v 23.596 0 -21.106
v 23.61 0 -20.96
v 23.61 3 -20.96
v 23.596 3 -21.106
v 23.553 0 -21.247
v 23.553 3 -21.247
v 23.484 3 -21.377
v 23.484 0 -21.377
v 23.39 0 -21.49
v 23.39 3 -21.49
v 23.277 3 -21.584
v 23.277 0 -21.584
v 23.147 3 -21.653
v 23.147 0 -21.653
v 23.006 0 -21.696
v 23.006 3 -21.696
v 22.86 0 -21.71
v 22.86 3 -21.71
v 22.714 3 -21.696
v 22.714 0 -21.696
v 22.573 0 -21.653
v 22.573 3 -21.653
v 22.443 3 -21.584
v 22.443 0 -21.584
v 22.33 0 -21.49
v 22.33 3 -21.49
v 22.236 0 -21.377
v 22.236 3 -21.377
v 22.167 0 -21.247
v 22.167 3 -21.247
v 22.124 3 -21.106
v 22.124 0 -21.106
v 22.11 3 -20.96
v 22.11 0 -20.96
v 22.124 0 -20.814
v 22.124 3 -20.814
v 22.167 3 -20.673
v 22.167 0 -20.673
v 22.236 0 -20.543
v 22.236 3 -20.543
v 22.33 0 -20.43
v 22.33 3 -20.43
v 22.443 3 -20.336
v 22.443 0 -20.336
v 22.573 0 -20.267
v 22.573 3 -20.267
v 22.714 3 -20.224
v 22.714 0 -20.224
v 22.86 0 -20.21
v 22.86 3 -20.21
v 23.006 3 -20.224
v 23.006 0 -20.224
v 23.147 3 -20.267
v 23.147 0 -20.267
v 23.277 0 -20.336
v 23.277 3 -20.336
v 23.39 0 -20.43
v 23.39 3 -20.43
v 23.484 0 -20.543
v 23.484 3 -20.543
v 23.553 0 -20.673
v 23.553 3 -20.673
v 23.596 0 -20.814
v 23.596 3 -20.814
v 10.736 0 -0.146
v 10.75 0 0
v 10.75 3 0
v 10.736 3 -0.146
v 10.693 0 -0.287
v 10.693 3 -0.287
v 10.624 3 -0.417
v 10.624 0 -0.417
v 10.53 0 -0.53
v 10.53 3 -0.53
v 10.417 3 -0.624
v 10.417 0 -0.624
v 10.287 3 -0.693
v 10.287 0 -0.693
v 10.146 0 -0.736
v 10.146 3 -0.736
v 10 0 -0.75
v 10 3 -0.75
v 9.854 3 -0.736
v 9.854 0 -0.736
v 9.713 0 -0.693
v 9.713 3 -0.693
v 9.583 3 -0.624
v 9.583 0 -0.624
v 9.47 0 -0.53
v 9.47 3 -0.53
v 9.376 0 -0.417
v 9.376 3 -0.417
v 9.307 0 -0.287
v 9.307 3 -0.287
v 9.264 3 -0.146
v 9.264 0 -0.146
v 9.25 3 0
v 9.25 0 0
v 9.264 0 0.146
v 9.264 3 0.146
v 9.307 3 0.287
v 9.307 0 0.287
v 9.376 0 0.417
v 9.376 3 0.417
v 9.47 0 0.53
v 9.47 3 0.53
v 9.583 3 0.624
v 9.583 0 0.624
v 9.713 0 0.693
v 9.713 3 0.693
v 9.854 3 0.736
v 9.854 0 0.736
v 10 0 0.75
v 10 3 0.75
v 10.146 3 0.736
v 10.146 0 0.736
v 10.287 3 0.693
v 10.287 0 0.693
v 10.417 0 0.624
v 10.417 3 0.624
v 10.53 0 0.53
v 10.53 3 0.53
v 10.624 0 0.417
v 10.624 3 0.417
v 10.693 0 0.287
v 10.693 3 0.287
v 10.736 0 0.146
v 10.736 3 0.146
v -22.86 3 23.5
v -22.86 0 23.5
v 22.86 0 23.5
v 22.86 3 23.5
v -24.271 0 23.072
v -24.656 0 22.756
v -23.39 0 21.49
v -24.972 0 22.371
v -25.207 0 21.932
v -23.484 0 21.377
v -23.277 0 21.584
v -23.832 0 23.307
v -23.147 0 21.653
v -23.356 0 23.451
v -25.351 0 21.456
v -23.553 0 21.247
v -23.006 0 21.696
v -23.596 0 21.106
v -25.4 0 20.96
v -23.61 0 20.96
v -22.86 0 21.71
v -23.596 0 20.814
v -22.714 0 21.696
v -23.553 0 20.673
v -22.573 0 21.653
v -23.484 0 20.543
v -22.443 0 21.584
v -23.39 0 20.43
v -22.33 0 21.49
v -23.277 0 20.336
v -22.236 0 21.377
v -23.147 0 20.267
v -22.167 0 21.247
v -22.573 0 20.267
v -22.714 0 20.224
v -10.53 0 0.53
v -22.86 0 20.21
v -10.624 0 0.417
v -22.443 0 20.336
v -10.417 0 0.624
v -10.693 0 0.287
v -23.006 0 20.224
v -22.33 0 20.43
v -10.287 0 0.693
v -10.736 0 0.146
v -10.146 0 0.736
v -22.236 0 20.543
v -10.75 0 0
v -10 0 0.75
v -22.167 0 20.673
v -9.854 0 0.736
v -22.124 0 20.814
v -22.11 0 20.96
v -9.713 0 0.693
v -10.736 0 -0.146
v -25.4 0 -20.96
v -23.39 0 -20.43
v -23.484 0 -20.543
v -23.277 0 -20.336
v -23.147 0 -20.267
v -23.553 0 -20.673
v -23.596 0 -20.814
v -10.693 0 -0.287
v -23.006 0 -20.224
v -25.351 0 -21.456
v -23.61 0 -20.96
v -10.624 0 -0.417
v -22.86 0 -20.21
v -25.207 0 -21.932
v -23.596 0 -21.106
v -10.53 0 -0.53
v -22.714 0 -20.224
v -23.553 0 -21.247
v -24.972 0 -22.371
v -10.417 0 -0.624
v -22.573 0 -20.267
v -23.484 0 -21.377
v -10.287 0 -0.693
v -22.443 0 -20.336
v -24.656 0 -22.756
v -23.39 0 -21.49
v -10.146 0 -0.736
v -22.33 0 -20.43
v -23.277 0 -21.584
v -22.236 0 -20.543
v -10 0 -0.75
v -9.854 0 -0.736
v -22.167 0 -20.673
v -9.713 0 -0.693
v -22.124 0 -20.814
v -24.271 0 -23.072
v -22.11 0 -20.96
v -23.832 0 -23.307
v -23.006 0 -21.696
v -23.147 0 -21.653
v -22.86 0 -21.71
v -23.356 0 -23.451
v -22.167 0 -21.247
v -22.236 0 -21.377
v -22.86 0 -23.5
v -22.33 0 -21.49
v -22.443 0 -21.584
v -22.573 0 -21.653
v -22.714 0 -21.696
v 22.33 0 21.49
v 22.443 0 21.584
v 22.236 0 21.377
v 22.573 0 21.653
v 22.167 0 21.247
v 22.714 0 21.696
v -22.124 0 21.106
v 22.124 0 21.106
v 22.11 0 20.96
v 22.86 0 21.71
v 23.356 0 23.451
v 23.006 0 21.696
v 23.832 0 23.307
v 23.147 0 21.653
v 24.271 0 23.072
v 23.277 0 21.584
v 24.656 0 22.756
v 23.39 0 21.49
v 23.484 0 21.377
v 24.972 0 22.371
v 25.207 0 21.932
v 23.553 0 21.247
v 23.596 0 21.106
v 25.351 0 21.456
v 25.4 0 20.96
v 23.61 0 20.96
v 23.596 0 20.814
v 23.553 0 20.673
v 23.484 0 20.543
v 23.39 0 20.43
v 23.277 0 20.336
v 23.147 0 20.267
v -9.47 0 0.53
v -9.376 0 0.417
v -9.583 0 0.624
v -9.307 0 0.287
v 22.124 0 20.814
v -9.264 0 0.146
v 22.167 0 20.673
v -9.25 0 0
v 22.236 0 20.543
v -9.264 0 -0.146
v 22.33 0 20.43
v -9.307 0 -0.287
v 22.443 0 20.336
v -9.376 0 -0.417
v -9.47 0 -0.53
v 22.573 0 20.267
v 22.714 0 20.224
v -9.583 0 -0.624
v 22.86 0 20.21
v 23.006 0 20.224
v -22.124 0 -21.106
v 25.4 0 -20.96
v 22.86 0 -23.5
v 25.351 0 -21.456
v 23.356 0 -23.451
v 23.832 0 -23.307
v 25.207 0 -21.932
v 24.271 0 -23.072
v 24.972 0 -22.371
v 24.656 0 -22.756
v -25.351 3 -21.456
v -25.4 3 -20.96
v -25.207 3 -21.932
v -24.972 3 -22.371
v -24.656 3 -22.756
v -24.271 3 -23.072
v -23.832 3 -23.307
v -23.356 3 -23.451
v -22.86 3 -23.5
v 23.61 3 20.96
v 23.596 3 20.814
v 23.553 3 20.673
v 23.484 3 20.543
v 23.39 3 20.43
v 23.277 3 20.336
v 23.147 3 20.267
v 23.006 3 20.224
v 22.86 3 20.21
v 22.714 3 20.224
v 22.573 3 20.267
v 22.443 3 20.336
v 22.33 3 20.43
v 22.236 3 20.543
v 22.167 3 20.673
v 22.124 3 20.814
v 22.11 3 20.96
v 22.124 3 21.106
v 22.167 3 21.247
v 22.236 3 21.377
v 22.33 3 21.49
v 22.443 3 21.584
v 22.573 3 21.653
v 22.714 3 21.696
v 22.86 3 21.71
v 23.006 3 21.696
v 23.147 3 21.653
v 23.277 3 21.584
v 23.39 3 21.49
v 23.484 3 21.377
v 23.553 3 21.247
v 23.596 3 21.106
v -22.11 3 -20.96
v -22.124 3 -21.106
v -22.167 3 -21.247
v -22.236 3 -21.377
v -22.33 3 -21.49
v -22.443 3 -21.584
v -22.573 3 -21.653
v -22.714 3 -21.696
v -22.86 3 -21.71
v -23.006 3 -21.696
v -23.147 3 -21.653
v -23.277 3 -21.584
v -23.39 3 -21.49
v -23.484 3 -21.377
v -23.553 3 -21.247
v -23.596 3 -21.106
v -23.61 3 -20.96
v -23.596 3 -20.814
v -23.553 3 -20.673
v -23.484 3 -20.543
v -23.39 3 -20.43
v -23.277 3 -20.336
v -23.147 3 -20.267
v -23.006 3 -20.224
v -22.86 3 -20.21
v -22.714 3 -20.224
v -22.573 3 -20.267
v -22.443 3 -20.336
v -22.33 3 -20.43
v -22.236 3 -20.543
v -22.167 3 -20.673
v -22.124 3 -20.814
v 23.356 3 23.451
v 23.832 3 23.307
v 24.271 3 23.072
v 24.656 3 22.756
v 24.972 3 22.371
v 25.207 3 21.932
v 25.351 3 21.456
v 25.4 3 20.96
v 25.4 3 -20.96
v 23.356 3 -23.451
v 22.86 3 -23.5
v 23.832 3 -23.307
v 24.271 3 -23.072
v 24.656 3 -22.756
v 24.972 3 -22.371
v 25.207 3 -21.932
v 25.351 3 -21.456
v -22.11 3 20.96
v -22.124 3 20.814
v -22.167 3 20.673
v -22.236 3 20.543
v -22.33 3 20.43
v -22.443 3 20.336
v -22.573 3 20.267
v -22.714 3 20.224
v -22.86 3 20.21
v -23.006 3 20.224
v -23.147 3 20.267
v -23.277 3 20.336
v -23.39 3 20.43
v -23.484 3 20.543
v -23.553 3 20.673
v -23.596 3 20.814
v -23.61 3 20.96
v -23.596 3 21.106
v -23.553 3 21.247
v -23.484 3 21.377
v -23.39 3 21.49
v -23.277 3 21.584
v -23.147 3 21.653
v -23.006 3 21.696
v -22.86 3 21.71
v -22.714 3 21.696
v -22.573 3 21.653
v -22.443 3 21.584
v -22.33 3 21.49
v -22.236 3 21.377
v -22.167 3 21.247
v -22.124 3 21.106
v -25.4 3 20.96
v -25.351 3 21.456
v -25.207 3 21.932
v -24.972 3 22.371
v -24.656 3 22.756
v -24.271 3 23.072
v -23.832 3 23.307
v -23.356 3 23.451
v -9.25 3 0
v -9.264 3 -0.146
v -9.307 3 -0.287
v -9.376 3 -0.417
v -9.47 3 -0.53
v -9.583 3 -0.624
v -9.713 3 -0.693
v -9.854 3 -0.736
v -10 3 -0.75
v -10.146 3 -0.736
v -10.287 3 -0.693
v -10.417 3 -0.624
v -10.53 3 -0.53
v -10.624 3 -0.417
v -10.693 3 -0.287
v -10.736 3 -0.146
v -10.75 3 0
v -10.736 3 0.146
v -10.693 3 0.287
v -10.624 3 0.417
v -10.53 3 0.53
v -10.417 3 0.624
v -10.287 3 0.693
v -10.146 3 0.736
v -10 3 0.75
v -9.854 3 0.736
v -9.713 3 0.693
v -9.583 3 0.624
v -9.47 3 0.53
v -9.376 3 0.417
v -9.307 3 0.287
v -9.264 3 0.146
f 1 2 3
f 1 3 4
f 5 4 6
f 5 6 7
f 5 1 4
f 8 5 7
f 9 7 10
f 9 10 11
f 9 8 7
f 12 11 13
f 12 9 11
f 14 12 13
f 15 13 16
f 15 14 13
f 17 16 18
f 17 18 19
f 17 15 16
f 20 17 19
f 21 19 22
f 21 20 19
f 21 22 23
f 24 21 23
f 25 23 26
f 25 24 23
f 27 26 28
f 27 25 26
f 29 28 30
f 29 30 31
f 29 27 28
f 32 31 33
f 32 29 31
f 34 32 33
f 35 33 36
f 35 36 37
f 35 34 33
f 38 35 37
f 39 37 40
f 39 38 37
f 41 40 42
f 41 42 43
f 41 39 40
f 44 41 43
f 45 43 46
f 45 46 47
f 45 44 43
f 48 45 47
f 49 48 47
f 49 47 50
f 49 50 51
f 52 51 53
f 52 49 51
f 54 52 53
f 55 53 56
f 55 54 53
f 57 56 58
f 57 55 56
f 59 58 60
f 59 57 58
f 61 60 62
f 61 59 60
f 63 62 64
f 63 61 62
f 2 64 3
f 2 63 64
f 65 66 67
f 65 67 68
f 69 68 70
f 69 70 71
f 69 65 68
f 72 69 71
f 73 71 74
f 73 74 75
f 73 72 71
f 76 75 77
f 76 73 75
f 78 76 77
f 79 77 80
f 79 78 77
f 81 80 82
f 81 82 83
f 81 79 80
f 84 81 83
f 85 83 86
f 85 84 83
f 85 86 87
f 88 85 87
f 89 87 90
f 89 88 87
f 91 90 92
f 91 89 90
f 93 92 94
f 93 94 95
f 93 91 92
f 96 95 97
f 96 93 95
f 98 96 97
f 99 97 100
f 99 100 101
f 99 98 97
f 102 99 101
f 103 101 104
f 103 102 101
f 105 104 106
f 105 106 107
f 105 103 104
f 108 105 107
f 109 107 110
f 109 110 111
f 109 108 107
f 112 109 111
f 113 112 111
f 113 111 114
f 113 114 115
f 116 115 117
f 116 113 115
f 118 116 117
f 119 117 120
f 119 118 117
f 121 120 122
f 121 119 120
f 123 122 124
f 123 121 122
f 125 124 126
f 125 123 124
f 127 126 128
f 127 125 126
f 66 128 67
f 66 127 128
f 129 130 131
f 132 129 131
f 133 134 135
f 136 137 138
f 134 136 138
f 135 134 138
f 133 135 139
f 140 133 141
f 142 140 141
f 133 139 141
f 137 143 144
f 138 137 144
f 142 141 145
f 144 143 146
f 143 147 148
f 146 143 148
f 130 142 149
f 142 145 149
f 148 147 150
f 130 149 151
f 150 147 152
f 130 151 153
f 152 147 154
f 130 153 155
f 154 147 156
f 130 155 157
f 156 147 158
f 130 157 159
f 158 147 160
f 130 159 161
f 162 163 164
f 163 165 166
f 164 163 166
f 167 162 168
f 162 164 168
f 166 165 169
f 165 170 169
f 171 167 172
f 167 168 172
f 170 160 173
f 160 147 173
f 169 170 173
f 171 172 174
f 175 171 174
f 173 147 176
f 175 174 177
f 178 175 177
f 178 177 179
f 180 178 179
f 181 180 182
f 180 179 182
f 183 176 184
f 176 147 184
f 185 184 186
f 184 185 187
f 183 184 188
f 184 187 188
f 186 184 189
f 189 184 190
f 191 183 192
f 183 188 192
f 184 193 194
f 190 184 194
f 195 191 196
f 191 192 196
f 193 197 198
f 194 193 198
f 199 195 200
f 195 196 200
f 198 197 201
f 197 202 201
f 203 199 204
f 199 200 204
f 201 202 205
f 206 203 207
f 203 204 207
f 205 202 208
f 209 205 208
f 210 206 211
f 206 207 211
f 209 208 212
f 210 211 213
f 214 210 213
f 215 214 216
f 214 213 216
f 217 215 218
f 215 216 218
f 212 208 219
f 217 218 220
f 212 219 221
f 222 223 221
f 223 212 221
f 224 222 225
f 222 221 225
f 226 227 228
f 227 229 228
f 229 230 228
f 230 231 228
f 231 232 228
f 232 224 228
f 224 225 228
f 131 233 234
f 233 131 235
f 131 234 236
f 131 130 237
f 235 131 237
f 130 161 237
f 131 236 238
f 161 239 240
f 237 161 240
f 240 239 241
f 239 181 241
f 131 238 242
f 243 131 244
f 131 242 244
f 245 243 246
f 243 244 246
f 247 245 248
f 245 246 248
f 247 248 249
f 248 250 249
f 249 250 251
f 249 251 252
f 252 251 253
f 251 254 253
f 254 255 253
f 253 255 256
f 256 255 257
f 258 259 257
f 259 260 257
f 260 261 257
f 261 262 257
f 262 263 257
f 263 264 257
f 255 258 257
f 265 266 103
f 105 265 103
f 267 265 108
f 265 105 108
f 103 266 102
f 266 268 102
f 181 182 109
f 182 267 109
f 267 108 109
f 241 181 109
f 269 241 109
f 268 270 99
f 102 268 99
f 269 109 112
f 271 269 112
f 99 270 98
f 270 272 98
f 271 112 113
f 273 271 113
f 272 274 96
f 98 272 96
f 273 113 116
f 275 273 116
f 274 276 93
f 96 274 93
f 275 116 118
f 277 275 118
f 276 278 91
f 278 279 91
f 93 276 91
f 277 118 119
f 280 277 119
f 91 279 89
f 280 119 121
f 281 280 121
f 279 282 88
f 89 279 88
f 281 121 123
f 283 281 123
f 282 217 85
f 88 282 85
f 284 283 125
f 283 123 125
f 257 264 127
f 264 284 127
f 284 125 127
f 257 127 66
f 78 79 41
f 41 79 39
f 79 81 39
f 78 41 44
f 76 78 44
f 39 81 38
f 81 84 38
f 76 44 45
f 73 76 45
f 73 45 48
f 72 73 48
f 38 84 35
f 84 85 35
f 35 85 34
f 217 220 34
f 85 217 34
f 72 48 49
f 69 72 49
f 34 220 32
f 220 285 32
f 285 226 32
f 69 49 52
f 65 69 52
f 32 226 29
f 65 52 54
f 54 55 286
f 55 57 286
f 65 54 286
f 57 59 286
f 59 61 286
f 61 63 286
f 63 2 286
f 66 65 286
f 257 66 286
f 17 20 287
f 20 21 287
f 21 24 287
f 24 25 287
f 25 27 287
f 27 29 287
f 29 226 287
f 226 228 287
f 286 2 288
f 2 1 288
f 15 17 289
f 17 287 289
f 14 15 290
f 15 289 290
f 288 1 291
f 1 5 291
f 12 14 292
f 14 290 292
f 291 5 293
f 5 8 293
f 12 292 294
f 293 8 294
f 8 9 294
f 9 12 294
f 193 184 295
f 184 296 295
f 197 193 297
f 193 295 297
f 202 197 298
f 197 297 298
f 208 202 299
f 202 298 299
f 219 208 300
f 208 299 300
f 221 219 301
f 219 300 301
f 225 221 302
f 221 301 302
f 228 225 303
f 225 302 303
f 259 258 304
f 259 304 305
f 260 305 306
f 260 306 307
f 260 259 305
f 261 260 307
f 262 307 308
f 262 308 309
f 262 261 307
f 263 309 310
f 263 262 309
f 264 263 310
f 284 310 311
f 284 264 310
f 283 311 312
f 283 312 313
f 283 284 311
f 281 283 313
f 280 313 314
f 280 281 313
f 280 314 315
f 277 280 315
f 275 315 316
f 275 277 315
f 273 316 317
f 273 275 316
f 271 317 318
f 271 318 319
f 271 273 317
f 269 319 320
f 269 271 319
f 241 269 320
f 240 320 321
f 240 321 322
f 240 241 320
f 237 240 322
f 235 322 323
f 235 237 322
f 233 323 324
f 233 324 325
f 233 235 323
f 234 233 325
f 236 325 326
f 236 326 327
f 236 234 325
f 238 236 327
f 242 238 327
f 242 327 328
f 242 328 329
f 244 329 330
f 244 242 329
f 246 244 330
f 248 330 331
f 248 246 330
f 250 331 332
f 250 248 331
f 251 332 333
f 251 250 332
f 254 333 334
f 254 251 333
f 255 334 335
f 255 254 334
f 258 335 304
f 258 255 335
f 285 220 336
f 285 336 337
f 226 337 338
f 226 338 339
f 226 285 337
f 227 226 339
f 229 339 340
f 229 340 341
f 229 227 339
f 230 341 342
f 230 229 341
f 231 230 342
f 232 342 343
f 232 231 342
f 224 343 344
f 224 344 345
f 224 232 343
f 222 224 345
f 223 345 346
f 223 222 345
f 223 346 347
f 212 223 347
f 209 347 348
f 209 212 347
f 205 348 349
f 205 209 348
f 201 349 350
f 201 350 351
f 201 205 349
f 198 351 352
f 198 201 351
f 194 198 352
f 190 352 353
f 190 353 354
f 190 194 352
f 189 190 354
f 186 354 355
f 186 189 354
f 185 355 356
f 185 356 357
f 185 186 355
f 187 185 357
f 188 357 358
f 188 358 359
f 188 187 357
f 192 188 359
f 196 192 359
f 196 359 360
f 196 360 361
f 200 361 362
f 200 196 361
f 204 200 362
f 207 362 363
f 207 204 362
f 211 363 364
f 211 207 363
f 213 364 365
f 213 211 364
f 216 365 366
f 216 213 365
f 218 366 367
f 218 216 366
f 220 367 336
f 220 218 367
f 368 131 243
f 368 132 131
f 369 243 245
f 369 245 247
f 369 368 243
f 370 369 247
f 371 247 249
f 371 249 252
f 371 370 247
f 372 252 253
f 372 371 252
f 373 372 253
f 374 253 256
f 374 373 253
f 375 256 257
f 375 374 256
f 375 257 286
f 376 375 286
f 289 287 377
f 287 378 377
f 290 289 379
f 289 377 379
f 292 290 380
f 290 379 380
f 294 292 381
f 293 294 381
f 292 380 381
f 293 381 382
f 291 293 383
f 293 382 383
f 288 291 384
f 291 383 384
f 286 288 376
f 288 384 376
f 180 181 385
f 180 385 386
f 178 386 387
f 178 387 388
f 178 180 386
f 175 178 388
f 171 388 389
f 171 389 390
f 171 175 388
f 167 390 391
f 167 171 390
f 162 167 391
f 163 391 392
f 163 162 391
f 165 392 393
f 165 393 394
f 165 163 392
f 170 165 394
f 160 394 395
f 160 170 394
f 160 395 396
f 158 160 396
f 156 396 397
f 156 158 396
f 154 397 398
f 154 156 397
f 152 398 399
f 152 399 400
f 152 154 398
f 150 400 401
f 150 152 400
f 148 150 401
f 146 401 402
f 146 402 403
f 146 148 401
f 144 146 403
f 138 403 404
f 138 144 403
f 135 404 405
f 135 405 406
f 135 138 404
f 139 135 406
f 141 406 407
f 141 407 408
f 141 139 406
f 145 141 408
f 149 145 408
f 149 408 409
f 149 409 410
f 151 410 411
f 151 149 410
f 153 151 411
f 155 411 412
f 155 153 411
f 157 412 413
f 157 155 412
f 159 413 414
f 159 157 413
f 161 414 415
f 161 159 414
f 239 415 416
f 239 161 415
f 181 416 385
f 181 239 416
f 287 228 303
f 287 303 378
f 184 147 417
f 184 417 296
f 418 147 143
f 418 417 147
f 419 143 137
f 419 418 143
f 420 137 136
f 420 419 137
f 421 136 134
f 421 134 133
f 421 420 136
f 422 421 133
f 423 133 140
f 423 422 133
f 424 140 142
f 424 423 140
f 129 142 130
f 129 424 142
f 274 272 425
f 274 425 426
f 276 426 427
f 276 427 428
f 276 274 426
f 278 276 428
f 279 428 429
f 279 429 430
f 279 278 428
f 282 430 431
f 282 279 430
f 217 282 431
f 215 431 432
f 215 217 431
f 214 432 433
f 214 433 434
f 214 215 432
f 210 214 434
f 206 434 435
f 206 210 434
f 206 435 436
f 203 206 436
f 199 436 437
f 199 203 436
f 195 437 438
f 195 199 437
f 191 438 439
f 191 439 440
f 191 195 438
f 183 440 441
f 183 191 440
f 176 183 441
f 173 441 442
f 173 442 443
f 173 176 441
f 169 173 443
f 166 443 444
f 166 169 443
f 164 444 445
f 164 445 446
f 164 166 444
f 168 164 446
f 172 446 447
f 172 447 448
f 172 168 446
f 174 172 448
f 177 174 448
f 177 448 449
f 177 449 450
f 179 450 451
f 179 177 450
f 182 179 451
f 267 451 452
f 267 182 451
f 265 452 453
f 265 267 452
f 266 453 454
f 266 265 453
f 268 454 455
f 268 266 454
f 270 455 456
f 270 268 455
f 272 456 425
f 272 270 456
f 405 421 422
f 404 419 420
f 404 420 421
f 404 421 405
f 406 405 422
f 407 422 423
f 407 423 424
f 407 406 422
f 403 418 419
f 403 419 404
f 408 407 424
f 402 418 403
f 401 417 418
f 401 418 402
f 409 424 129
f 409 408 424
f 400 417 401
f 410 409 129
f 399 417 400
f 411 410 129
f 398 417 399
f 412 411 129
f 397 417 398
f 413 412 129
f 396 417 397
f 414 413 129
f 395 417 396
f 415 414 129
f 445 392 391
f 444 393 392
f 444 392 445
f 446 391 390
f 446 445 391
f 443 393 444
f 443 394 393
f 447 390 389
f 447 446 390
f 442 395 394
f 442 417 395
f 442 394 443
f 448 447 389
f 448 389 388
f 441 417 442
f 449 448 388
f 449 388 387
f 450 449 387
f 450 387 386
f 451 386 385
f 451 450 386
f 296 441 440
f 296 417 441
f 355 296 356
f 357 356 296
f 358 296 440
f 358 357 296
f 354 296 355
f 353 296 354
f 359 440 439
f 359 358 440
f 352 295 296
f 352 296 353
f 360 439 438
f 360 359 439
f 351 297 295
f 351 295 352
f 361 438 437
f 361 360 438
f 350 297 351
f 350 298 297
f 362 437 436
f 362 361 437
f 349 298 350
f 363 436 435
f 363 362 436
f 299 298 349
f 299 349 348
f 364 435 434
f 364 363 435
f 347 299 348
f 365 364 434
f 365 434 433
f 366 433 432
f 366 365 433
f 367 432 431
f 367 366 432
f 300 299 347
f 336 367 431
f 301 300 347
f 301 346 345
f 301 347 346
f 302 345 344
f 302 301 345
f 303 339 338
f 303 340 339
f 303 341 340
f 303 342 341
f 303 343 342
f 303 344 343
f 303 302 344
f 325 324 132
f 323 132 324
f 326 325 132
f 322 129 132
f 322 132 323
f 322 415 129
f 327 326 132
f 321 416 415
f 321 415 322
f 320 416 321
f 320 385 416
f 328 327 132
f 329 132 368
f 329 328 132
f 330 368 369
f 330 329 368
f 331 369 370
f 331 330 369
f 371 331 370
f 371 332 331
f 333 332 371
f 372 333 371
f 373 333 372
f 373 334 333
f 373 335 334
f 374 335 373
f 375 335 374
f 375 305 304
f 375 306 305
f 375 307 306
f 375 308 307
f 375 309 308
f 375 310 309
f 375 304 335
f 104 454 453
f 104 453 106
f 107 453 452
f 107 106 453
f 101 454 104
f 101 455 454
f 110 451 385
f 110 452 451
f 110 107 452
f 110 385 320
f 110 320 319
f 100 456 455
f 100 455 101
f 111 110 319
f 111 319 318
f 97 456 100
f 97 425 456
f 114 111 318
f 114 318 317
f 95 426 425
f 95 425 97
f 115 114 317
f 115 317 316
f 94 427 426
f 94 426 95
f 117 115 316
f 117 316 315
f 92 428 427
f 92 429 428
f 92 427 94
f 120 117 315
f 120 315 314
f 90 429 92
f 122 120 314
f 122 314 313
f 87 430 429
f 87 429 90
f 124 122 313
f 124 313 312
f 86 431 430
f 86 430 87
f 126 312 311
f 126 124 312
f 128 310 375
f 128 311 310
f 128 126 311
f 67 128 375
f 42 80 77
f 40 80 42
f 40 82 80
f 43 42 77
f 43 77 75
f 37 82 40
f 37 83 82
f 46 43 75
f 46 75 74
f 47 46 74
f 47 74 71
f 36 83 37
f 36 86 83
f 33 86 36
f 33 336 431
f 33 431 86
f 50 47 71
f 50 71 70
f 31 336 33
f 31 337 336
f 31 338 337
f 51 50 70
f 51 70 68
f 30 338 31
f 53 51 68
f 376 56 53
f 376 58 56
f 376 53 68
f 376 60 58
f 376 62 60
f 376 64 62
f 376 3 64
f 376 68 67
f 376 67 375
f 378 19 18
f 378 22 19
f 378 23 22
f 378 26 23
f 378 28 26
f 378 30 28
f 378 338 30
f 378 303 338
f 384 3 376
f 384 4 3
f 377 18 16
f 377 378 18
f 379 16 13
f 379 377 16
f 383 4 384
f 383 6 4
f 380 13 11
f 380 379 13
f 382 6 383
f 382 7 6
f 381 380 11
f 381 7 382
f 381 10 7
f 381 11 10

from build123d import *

# Parameters (mm, degrees)
SKETCH1_W           = 50.8
SKETCH1_H           = 47
SKETCH1_R           = 0.75
BOSS_EXTRUDE1_DEPTH = 3
FILLET1_R           = 2.54


with BuildPart() as part:
    # Sketch1 → Boss-Extrude1 (new body)
    with BuildSketch(Plane(origin=(0, 0, 0), x_dir=(1, 0, 0), z_dir=(0, 1, 0))):
        Rectangle(SKETCH1_W, SKETCH1_H)
        with Locations((-22.86, 20.96)):
            Circle(SKETCH1_R, mode=Mode.SUBTRACT)
        with Locations((22.86, 20.96)):
            Circle(SKETCH1_R, mode=Mode.SUBTRACT)
        with Locations((22.86, -20.96)):
            Circle(SKETCH1_R, mode=Mode.SUBTRACT)
        with Locations((-22.86, -20.96)):
            Circle(SKETCH1_R, mode=Mode.SUBTRACT)
        with Locations((10, 0)):
            Circle(SKETCH1_R, mode=Mode.SUBTRACT)
        with Locations((-10, 0)):
            Circle(SKETCH1_R, mode=Mode.SUBTRACT)
    extrude(amount=BOSS_EXTRUDE1_DEPTH)

    # Fillet1
    fillet1_edges = [part.edges().sort_by_distance(p)[0] for p in [
        (-25.4, 1.5, -23.5),
        (25.4, 1.5, -23.5),
        (25.4, 1.5, 23.5),
        (-25.4, 1.5, 23.5),
    ]]
    fillet(fillet1_edges, radius=FILLET1_R)


solid = part.part
